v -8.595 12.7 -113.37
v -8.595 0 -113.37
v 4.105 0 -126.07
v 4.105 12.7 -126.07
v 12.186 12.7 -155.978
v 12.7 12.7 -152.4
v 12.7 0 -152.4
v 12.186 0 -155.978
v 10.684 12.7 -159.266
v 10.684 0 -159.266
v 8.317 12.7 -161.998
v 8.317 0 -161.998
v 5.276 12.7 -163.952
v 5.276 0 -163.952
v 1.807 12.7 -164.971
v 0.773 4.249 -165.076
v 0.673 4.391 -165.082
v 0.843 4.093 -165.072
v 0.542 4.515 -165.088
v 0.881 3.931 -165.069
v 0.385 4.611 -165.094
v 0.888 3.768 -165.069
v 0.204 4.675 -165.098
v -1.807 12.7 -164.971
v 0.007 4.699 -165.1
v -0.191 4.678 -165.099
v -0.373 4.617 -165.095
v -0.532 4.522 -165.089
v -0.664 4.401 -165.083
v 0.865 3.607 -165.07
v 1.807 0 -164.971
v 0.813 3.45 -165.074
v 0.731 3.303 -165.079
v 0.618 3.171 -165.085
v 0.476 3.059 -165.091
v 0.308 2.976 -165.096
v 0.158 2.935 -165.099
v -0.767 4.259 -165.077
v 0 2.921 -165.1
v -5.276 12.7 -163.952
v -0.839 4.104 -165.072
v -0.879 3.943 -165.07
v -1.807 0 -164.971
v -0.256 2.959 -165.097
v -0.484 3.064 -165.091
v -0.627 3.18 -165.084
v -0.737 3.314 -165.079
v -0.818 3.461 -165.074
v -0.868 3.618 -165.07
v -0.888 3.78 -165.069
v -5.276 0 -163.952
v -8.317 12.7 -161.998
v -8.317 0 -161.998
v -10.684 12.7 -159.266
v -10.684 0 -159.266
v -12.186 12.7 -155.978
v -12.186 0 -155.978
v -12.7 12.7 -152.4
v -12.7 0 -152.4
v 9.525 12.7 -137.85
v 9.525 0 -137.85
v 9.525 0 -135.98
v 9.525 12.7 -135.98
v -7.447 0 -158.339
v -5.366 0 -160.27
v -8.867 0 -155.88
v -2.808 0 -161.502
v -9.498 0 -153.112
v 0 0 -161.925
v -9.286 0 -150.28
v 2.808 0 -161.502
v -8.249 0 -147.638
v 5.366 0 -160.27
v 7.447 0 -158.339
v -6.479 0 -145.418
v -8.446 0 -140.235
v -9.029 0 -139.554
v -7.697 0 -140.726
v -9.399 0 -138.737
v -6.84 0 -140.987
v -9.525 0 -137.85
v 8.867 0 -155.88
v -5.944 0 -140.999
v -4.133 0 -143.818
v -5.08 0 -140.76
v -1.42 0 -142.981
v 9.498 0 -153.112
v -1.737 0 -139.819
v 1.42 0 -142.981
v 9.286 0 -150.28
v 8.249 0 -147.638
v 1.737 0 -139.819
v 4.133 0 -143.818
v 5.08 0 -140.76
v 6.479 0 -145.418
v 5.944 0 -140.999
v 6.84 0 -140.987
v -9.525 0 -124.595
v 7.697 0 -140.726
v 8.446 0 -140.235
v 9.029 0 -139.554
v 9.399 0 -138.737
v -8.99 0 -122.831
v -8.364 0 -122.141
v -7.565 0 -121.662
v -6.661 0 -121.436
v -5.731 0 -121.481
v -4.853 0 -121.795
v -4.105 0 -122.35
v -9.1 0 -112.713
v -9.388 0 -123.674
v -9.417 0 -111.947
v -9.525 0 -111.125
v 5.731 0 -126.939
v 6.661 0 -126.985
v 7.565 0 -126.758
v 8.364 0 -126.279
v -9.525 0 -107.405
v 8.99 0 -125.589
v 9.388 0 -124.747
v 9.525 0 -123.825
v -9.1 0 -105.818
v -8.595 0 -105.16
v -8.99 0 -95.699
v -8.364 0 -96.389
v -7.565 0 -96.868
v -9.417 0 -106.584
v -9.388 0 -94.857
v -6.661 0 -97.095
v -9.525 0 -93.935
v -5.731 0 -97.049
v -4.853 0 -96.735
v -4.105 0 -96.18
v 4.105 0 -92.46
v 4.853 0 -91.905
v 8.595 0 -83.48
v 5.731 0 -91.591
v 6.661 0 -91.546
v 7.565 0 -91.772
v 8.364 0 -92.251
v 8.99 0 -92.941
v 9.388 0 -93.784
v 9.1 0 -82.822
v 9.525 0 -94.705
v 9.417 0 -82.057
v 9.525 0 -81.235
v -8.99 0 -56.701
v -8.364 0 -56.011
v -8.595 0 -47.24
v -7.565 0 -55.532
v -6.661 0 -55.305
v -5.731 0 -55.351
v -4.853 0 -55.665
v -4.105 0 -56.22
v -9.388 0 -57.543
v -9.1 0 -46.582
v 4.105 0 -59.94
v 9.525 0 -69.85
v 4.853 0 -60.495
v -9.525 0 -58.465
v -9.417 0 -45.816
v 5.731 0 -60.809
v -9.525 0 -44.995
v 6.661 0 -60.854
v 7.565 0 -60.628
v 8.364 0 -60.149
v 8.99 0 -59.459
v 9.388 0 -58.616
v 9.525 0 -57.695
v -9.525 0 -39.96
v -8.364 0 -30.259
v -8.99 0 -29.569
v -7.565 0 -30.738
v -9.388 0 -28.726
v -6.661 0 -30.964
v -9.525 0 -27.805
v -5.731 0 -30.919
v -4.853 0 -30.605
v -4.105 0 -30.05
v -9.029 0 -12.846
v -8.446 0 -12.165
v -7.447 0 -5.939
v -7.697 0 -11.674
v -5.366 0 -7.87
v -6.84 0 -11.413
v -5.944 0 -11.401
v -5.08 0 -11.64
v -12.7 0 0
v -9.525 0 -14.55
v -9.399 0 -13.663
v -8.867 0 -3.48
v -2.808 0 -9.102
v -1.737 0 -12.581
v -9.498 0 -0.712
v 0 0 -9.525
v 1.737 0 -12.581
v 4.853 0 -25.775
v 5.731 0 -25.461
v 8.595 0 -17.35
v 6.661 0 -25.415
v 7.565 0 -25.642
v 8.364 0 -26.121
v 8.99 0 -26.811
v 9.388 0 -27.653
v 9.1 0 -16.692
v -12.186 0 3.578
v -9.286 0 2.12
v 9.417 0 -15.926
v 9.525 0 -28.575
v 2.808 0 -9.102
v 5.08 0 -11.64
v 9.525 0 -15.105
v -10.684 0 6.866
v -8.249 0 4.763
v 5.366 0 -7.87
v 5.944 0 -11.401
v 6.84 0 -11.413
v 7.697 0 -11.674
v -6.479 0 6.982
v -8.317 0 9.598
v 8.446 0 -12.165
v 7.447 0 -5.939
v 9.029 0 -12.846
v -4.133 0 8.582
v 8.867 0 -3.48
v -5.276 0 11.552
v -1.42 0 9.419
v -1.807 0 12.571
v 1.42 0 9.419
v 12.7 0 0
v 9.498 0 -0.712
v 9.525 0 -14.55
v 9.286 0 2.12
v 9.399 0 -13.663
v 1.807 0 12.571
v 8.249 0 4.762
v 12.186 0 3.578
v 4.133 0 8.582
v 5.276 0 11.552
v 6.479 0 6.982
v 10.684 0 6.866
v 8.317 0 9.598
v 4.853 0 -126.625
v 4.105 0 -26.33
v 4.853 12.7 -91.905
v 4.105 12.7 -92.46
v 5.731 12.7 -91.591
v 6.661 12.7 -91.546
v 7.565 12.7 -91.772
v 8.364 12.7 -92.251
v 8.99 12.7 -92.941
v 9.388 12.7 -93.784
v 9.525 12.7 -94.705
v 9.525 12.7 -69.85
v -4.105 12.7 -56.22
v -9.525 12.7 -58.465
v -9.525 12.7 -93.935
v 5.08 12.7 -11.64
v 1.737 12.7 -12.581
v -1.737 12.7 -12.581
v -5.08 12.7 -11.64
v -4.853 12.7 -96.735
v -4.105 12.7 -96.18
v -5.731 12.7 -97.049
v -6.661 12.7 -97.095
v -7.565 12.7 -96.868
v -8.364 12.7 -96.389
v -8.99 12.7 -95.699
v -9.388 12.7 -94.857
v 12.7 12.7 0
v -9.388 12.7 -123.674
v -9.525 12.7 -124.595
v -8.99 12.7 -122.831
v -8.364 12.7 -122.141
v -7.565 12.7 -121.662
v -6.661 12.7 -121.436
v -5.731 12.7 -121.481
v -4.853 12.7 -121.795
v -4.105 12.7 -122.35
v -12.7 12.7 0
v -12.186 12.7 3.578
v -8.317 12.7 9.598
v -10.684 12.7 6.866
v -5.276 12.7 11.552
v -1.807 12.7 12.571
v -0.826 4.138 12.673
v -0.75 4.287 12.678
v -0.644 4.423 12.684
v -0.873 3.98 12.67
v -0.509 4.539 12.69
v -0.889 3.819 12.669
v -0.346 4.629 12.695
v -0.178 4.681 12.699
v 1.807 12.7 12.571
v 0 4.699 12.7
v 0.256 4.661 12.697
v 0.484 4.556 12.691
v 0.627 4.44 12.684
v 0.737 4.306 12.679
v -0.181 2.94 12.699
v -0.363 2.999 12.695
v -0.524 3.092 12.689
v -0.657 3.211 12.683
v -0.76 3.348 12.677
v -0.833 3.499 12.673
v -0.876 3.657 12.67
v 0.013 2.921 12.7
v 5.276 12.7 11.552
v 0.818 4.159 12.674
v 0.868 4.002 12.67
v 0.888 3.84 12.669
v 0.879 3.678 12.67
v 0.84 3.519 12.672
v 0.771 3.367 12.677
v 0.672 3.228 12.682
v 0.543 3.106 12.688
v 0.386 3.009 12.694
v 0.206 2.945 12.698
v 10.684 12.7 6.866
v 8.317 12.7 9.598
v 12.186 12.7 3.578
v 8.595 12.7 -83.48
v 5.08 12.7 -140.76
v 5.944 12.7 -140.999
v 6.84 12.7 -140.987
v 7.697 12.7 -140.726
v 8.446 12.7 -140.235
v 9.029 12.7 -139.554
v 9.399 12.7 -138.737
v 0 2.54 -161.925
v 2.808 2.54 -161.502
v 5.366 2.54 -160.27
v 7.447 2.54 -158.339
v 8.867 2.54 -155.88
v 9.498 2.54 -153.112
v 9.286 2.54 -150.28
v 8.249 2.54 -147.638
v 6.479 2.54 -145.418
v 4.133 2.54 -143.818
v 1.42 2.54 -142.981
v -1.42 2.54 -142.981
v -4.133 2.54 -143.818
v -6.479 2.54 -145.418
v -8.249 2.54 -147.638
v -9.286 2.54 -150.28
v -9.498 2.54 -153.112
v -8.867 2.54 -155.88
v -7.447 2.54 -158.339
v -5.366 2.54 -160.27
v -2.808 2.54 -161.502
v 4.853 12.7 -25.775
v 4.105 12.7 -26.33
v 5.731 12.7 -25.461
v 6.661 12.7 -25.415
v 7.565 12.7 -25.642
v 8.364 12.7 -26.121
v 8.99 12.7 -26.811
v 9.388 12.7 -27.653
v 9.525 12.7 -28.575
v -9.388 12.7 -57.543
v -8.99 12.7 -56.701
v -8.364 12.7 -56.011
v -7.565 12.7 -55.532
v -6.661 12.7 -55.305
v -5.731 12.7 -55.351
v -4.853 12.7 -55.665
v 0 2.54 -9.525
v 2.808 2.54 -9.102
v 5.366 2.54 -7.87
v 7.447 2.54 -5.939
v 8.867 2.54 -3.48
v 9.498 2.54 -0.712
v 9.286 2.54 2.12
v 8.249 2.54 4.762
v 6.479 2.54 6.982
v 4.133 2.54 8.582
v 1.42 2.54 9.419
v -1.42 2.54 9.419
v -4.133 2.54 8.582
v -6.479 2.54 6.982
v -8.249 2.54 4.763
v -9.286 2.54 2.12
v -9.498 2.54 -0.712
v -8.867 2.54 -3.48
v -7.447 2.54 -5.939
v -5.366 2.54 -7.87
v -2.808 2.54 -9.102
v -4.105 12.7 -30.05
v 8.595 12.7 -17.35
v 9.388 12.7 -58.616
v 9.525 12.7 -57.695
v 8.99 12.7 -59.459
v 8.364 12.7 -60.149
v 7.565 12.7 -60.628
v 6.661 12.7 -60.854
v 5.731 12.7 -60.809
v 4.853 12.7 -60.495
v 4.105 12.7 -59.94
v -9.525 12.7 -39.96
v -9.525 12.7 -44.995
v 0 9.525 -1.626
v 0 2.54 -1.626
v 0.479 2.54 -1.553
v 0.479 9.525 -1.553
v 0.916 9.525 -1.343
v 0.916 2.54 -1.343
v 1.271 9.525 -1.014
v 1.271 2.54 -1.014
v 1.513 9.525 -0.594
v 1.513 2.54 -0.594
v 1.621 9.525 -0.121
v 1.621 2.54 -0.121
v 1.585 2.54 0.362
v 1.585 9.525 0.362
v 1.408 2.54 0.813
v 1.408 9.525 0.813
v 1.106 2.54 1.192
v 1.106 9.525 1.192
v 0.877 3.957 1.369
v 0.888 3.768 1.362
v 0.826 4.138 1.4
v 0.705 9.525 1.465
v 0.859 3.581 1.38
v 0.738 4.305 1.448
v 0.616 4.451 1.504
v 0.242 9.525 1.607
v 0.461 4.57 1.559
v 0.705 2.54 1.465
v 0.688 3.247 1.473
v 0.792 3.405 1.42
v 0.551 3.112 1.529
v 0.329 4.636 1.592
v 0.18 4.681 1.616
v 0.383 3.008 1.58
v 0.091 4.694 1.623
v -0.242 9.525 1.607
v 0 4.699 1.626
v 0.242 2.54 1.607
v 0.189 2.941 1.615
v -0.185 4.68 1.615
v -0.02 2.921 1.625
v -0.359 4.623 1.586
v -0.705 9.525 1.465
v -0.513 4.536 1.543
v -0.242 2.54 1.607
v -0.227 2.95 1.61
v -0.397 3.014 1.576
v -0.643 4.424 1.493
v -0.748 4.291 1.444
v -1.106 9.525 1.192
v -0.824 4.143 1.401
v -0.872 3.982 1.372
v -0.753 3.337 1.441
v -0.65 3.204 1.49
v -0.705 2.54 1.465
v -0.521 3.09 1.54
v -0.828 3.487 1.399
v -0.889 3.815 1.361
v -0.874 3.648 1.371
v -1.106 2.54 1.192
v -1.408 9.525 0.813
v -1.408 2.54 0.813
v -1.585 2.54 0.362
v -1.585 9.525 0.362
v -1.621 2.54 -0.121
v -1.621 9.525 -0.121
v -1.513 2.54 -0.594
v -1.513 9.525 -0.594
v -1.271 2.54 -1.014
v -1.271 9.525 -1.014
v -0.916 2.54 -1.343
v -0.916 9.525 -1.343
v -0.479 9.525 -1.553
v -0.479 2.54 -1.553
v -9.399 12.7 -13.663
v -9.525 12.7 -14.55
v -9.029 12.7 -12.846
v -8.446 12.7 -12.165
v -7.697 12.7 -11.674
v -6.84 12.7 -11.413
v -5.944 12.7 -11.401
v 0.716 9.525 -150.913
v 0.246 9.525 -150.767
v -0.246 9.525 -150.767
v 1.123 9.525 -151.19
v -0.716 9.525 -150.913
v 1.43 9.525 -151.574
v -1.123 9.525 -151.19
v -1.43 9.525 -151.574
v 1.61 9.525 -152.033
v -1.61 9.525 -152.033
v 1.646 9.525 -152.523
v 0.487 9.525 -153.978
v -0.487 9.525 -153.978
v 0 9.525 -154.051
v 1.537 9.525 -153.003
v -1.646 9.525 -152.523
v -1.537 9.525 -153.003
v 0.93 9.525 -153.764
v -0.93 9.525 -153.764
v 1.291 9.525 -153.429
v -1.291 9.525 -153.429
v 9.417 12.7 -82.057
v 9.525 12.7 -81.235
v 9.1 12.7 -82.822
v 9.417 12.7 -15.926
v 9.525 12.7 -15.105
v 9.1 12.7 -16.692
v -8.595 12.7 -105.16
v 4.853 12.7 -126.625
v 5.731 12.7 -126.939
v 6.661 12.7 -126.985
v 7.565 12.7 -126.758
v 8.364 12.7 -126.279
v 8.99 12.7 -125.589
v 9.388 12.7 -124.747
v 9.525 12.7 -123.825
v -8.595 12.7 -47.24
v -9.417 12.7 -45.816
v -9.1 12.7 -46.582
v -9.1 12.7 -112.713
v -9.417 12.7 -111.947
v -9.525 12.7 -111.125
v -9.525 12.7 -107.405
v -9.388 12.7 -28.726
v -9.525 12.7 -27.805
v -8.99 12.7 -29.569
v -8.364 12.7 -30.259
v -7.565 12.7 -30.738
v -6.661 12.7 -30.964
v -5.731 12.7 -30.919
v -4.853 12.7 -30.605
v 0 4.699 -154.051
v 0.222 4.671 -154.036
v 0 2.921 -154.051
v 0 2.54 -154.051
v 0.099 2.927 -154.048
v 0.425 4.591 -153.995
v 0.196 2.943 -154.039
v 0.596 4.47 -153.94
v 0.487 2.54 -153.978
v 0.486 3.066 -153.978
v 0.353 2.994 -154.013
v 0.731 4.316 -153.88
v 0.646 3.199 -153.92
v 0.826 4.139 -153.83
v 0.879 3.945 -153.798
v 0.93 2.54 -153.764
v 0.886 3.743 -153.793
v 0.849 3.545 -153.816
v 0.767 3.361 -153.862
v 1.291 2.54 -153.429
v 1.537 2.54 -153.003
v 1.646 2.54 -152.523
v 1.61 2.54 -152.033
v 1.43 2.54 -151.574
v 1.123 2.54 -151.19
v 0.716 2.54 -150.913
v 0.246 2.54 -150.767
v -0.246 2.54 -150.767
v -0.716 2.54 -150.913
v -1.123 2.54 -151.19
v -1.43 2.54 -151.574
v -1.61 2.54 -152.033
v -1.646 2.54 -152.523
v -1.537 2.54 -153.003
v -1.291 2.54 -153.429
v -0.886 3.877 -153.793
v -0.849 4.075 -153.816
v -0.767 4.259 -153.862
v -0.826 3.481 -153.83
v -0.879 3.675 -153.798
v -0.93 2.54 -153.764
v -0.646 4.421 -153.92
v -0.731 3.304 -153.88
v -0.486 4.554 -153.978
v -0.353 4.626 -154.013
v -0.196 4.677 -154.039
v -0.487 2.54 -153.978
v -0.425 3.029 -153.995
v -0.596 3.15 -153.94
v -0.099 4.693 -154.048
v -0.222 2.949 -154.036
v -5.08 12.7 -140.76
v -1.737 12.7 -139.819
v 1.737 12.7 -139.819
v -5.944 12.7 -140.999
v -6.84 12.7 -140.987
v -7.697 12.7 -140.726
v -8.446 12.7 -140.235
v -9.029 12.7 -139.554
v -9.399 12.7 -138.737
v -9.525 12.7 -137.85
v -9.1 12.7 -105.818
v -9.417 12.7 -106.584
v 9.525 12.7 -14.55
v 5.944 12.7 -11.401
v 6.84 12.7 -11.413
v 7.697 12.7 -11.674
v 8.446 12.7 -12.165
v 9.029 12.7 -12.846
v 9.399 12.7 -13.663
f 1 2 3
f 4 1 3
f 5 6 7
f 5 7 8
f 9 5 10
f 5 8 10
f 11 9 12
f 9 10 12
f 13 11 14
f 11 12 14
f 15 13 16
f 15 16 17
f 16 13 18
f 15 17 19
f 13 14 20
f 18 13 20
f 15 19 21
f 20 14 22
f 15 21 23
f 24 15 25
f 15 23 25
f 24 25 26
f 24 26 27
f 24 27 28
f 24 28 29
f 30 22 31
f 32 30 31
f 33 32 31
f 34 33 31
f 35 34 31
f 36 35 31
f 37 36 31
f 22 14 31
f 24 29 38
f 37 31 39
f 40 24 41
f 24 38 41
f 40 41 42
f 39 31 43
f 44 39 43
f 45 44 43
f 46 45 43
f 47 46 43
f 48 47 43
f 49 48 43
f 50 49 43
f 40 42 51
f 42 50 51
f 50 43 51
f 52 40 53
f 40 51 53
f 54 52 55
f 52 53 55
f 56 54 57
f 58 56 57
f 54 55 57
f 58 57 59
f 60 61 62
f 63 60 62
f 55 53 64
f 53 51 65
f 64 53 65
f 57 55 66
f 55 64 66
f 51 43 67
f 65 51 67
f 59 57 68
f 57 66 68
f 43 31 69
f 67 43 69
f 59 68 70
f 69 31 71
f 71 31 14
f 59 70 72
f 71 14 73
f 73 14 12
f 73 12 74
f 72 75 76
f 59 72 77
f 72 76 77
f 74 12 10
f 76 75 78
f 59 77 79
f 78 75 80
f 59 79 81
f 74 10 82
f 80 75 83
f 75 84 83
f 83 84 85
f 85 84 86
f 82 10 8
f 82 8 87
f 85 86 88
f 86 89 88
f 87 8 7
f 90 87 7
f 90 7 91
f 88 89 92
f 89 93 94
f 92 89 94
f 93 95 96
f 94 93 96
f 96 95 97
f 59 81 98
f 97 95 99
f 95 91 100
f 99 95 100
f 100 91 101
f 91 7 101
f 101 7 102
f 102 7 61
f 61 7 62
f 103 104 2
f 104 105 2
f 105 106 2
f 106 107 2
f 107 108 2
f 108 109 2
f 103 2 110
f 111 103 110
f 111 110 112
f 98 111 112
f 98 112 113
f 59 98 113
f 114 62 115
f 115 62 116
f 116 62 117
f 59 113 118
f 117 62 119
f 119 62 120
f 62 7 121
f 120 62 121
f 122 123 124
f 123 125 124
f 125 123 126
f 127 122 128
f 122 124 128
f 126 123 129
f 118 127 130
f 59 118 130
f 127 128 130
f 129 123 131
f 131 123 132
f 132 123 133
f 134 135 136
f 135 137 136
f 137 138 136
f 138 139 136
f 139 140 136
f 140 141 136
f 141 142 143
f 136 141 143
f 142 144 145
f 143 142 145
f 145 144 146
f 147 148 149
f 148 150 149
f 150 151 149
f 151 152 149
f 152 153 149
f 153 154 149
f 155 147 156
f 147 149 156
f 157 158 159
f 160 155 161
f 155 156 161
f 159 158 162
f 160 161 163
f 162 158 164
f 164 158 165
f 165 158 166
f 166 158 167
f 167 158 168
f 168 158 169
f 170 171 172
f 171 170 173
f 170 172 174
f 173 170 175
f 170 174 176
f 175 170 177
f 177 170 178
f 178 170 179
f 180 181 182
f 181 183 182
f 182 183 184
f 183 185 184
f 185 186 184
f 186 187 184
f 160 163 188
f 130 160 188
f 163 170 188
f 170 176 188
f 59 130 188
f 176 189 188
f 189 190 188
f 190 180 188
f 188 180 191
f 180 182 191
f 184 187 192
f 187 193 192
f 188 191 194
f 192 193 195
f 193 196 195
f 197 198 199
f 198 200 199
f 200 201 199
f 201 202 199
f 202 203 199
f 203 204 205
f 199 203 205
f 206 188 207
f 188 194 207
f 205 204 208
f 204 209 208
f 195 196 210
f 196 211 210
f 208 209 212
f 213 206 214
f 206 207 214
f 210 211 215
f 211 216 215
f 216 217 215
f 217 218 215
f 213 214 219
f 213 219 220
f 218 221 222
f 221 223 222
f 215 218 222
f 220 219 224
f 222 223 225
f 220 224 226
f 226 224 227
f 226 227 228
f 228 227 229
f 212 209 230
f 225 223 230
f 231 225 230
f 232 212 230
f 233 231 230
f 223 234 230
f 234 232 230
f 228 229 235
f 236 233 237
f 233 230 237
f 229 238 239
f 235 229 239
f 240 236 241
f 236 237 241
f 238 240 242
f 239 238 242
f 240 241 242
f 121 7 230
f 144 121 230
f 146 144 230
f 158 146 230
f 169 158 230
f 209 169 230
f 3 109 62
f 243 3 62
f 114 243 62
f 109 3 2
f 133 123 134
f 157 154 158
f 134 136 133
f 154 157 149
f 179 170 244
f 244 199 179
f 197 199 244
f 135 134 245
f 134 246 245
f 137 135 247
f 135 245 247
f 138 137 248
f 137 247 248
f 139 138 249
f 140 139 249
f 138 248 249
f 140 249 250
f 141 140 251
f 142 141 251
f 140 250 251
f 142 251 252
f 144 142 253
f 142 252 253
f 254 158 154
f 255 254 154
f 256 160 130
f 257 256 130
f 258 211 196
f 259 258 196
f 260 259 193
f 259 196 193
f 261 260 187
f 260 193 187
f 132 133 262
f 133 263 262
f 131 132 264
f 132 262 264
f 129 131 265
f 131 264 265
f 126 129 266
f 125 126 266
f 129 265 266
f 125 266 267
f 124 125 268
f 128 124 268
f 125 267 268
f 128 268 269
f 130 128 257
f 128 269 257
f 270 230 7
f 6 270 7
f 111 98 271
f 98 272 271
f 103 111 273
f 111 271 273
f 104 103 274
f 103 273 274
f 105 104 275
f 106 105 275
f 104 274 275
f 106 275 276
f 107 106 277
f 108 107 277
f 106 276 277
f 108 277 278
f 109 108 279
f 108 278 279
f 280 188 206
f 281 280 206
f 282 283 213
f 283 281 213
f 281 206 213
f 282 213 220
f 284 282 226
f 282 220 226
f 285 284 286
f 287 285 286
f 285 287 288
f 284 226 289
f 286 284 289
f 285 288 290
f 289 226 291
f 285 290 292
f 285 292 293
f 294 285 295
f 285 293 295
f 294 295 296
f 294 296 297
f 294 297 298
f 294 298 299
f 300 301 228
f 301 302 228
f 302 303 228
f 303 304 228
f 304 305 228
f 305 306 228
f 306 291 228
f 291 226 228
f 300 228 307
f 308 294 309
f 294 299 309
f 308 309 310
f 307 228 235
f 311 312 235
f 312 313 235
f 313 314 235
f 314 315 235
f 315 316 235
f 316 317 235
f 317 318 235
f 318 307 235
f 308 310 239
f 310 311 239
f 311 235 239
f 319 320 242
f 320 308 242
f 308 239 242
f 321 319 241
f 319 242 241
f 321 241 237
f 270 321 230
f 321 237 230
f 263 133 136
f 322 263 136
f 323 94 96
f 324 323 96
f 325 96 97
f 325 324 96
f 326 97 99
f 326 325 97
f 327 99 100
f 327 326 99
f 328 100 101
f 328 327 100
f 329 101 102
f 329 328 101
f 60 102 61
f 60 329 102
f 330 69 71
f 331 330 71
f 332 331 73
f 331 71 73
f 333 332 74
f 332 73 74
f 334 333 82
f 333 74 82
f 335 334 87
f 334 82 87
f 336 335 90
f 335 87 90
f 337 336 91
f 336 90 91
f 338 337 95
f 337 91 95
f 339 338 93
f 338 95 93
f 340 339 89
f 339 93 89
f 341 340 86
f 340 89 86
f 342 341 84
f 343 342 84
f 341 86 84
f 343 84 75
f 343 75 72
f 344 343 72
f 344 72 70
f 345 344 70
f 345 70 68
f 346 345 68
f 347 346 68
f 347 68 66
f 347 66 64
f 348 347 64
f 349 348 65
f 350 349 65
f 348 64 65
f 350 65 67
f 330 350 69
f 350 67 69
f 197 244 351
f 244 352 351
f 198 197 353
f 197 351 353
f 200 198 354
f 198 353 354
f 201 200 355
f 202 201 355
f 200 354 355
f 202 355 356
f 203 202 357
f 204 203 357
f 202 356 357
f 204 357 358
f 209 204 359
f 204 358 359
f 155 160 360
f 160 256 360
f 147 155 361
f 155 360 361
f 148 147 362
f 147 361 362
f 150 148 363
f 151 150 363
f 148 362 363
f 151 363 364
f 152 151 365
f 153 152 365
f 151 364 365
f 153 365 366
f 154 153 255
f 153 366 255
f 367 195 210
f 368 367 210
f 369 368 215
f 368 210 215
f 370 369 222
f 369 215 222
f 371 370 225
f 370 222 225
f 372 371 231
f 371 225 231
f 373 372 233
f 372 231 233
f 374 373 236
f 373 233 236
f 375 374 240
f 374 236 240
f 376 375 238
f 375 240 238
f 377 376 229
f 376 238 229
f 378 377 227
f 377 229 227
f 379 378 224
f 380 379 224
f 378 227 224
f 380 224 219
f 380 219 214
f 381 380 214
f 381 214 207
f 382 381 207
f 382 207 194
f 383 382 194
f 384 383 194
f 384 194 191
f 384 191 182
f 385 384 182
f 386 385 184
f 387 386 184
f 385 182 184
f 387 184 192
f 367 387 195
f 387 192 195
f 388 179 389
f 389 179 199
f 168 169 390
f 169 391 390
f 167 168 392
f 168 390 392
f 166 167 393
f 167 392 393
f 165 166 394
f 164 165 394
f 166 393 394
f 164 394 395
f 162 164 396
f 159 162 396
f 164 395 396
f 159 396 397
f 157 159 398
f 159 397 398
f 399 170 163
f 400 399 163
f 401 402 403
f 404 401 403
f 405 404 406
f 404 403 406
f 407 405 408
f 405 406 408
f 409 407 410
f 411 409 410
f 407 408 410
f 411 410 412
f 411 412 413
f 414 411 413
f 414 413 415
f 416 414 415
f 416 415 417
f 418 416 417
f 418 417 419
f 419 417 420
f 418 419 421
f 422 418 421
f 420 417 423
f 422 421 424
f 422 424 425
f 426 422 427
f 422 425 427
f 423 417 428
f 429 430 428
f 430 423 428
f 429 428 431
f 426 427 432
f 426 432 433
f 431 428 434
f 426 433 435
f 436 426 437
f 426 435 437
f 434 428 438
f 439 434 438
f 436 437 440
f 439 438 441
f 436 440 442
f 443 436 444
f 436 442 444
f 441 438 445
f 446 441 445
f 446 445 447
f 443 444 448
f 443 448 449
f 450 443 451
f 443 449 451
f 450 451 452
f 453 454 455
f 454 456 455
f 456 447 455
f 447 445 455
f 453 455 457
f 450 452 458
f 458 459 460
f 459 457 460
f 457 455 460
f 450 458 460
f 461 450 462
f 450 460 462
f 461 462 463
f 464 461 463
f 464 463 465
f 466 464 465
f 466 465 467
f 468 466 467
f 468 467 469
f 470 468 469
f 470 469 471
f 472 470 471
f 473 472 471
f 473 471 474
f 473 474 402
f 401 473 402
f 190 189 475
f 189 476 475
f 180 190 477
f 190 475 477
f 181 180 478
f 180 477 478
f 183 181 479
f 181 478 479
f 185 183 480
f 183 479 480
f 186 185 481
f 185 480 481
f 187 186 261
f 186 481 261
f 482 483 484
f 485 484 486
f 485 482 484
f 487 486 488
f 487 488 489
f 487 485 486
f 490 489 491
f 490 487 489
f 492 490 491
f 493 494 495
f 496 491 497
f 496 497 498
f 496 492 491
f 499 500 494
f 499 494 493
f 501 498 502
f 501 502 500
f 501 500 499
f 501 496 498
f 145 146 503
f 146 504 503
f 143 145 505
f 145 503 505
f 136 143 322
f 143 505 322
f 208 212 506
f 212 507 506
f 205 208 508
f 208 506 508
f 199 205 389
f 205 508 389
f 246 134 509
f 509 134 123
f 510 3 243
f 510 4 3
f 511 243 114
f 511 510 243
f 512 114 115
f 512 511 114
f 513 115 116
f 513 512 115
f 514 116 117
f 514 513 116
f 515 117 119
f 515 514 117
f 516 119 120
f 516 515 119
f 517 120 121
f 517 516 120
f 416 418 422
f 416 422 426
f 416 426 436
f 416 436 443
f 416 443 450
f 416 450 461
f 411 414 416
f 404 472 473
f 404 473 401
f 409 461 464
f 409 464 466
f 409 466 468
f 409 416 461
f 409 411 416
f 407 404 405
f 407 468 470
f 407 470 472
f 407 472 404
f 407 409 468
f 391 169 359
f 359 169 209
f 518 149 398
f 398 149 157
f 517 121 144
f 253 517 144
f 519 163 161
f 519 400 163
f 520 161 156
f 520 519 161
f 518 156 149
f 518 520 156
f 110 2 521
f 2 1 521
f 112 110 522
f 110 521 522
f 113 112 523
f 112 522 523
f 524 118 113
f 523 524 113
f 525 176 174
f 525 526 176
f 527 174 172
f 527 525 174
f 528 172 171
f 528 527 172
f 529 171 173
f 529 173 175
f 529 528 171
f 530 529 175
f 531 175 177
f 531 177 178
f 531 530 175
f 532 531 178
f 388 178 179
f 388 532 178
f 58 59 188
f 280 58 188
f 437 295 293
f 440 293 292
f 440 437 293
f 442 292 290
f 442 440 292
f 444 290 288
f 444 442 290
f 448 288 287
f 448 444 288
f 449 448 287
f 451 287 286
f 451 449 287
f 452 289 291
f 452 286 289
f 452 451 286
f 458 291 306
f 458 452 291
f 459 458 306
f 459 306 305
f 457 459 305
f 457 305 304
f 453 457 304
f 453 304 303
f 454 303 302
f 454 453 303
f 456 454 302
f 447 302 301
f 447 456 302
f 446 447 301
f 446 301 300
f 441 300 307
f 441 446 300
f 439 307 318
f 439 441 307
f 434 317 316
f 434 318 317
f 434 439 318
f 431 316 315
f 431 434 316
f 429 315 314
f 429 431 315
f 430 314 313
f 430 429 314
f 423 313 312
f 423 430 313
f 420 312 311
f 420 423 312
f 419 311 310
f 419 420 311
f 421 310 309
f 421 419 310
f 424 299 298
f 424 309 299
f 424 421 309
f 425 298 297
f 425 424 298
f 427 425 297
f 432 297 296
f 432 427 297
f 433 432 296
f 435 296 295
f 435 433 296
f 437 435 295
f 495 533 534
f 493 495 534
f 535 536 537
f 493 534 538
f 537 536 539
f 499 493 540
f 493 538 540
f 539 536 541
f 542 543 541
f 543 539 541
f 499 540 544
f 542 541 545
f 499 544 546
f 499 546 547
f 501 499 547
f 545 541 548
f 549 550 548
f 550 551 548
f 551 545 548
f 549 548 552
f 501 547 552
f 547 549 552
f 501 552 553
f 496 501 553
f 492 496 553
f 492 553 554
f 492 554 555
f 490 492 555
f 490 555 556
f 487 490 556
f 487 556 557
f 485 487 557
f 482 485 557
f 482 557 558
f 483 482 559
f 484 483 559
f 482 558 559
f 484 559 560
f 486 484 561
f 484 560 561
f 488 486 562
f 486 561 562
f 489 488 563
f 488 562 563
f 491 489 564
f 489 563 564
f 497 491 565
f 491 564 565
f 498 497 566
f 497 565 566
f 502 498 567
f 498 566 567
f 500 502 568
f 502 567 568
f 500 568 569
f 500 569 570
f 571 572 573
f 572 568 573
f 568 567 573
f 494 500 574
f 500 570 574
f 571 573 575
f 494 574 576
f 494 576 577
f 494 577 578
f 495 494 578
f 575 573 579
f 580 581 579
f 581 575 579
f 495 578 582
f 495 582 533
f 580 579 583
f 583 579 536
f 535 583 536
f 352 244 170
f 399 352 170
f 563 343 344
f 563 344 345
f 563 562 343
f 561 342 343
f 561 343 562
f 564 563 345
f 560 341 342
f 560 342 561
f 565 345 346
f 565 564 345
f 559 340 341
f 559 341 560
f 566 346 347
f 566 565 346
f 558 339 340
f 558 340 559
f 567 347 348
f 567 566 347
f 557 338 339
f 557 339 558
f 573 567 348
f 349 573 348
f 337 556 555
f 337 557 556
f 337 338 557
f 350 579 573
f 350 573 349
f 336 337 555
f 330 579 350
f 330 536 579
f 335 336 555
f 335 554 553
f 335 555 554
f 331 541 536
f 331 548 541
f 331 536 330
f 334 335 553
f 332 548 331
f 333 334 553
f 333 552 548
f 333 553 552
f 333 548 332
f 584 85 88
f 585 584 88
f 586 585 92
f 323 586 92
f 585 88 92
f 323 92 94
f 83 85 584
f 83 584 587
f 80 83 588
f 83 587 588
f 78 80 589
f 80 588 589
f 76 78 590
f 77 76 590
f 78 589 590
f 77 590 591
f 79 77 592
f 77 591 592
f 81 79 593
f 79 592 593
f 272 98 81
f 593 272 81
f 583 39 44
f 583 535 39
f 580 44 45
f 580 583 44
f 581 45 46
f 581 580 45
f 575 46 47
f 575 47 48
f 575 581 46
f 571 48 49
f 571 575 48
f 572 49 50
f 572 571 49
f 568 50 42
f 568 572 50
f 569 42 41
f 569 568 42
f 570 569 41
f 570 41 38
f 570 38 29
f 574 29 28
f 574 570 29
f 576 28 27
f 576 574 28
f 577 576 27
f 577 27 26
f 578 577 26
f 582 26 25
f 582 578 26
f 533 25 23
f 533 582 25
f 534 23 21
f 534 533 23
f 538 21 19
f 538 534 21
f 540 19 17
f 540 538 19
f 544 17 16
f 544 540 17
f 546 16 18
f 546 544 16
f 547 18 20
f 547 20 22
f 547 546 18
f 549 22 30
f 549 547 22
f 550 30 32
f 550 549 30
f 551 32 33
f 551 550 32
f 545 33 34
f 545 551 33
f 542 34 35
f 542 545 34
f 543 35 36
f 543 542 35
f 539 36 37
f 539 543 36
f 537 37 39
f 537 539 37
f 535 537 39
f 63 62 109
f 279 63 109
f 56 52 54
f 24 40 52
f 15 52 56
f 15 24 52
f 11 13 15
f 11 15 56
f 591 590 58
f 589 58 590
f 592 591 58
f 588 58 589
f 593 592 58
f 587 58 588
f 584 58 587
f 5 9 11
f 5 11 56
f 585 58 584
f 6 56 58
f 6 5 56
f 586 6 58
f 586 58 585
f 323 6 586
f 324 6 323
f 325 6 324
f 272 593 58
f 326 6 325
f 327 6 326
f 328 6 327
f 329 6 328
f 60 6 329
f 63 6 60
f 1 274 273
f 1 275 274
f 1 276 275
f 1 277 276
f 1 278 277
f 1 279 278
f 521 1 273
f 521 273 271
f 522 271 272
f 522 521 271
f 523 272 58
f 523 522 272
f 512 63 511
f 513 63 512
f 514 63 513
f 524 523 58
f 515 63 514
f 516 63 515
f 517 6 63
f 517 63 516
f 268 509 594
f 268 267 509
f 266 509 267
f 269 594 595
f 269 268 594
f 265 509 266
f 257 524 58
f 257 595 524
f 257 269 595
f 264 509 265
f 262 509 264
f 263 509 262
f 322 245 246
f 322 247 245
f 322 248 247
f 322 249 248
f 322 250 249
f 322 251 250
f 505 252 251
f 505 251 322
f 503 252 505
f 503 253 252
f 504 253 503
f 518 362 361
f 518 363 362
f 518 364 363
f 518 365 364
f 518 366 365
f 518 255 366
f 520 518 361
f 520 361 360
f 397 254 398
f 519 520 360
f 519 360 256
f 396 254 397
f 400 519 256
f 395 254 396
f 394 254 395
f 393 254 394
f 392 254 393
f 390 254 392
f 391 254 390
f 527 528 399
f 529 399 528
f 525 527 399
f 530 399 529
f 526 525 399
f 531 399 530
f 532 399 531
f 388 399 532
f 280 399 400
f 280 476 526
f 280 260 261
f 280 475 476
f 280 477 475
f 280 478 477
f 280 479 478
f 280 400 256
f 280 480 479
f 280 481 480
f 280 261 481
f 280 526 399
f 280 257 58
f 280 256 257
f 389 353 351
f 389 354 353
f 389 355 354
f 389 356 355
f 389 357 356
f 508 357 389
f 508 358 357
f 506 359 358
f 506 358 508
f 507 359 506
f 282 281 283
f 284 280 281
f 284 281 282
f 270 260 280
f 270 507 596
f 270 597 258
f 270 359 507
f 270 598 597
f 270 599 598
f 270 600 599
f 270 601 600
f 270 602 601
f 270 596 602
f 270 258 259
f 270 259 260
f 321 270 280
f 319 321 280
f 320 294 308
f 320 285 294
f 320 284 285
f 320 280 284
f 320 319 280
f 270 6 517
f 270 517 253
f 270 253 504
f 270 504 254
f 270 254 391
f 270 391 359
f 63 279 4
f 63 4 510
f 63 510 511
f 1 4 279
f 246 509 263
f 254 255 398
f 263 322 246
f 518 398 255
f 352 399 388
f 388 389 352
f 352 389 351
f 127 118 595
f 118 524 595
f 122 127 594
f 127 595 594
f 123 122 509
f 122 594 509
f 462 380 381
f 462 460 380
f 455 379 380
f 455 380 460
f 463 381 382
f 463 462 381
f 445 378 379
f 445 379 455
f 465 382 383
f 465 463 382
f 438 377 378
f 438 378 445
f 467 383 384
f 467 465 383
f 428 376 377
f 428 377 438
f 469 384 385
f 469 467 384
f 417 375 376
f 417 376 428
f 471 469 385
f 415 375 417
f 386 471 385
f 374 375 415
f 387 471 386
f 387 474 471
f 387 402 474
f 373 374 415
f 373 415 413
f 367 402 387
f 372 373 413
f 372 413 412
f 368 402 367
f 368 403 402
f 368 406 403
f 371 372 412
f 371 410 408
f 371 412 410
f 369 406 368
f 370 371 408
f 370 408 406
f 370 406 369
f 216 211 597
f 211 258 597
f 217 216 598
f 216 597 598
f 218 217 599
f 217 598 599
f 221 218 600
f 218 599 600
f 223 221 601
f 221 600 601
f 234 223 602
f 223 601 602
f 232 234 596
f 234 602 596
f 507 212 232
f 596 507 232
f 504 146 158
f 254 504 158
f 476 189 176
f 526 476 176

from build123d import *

# Parameters (mm, degrees)
SKETCH1_R           = 12.7
BOSS_EXTRUDE1_DEPTH = 12.7
SKETCH2_R           = 1.6256
CUT_EXTRUDE1_DEPTH  = 9.525
SKETCH3_R           = 9.525
CUT_EXTRUDE2_DEPTH  = 2.54
BOSS_EXTRUDE2_START = -12.7
BOSS_EXTRUDE2_DEPTH = 12.7
SKETCH10_R          = 1.651
CUT_EXTRUDE4_DEPTH  = 9.525
SKETCH11_R          = 9.525
CUT_EXTRUDE5_DEPTH  = 2.54
CUT_EXTRUDE6_DEPTH  = 12.7
FILLET1_R           = 3.175


with BuildPart() as part:
    # Sketch1 → Boss-Extrude1 (new body)
    with BuildSketch(Plane(origin=(0, 0, 0), x_dir=(1, 0, 0), z_dir=(0, 1, 0))):
        with Locations(Location((0, 0, 0), (0, 0, 270))):
            Circle(SKETCH1_R)
    extrude(amount=BOSS_EXTRUDE1_DEPTH)

    # Sketch2 → Cut-Extrude1 (cut)
    with BuildSketch(Plane.XZ):
        with Locations(Location((0, 0, 0), (0, 0, 270))):
            Circle(SKETCH2_R)
    extrude(amount=-CUT_EXTRUDE1_DEPTH, mode=Mode.SUBTRACT)

    # Sketch3 → Cut-Extrude2 (cut)
    with BuildSketch(Plane.XZ):
        with Locations(Location((0, 0, 0), (0, 0, 270))):
            Circle(SKETCH3_R)
    extrude(amount=-CUT_EXTRUDE2_DEPTH, mode=Mode.SUBTRACT)

    # Sketch5 → #2-56 Tapped Hole1 (revolve, cut)
    with BuildSketch(Plane(origin=(0, 3.81, 0), x_dir=(0, 1, 0), z_dir=(1, 0, 0))):
        Polygon((0, 0), (0, 13.74216509), (0.889, 13.208), (0.889, 0), align=None)
    revolve(axis=Axis((0, 3.81, -6.35), (0, 0, 1)), mode=Mode.SUBTRACT)

    # Sketch7 → Boss-Extrude2 (add)
    with BuildSketch(Plane(origin=(0, 12.7, 0), x_dir=(1, 0, 0), z_dir=(0, 1, 0)).offset(BOSS_EXTRUDE2_START)):
        with BuildLine():
            Line((-12.7, 152.4), (-12.7, 0))
            ThreePointArc((-12.7, 0), (0, 12.7), (12.7, 0))
            Line((12.7, 0), (12.7, 152.4))
            ThreePointArc((12.7, 152.4), (0, 165.1), (-12.7, 152.4))
        make_face()
    extrude(amount=BOSS_EXTRUDE2_DEPTH)

    # Sketch10 → Cut-Extrude4 (cut)
    with BuildSketch(Plane.XZ):
        with Locations(Location((0, -152.4, 0), (0, 0, 270))):
            Circle(SKETCH10_R)
    extrude(amount=-CUT_EXTRUDE4_DEPTH, mode=Mode.SUBTRACT)

    # Sketch11 → Cut-Extrude5 (cut)
    with BuildSketch(Plane.XZ):
        with Locations(Location((0, -152.4, 0), (0, 0, 270))):
            Circle(SKETCH11_R)
    extrude(amount=-CUT_EXTRUDE5_DEPTH, mode=Mode.SUBTRACT)

    # Sketch14 → #2-56 Tapped Hole2 (revolve, cut)
    with BuildSketch(Plane(origin=(0, 3.81, -152.4), x_dir=(0, -1, 0), z_dir=(1, 0, 0))):
        Polygon((0, 0), (0, 13.74216509), (0.889, 13.208), (0.889, 0), align=None)
    revolve(axis=Axis((0, 3.81, -146.05), (0, 0, -1)), mode=Mode.SUBTRACT)

    # Sketch15 → Cut-Extrude6 (cut)
    with BuildSketch(Plane.XZ):
        with BuildLine():
            Line((-9.525, -35.469743879), (9.525, -16.419743879))
            Line((9.525, -16.419743879), (9.525, -8.400260413))
            ThreePointArc((9.525, -8.400260413), (0, -12.7), (-9.525, -8.400260413))
            Line((-9.525, -8.400260413), (-9.525, -35.469743879))
        make_face()
        Polygon((-9.525, -46.309871939), (9.525, -65.359871939), (9.525, -20.909871939), (-9.525, -39.959871939), align=None)
        Polygon((-9.525, -76.2), (9.525, -76.2), (9.525, -69.85), (-9.525, -50.8), align=None)
        Polygon((9.525, -82.55), (9.525, -76.2), (-9.525, -76.2), (-9.525, -101.6), align=None)
        Polygon((9.525, -131.490128061), (9.525, -87.040128061), (-9.525, -106.090128061), (-9.525, -112.440128061), align=None)
        with BuildLine():
            Line((9.525, -143.999739587), (9.525, -135.980256121))
            Line((9.525, -135.980256121), (-9.525, -116.930256121))
            Line((-9.525, -116.930256121), (-9.525, -143.999739587))
            ThreePointArc((-9.525, -143.999739587), (0, -139.7), (9.525, -143.999739587))
        make_face()
    extrude(amount=-CUT_EXTRUDE6_DEPTH, mode=Mode.SUBTRACT)

    # Fillet1
    fillet1_edges = [part.edges().sort_by_distance(p)[0] for p in [
        (9.525, 6.35, -143.999739587),
        (-9.525, 6.35, -143.999739587),
        (-9.525, 6.35, -116.930256121),
        (-9.525, 6.35, -35.469743879),
        (9.525, 6.35, -16.419743879),
        (9.525, 6.35, -8.400260413),
        (-9.525, 6.35, -8.400260413),
        (-9.525, 6.35, -46.309871939),
        (9.525, 6.35, -65.359871939),
        (9.525, 6.35, -20.909871939),
        (-9.525, 6.35, -101.6),
        (-9.525, 6.35, -50.8),
        (9.525, 6.35, -82.55),
        (9.525, 6.35, -131.490128061),
        (9.525, 6.35, -87.040128061),
        (-9.525, 6.35, -106.090128061),
        (-9.525, 6.35, -112.440128061),
    ]]
    fillet(fillet1_edges, radius=FILLET1_R)


solid = part.part
